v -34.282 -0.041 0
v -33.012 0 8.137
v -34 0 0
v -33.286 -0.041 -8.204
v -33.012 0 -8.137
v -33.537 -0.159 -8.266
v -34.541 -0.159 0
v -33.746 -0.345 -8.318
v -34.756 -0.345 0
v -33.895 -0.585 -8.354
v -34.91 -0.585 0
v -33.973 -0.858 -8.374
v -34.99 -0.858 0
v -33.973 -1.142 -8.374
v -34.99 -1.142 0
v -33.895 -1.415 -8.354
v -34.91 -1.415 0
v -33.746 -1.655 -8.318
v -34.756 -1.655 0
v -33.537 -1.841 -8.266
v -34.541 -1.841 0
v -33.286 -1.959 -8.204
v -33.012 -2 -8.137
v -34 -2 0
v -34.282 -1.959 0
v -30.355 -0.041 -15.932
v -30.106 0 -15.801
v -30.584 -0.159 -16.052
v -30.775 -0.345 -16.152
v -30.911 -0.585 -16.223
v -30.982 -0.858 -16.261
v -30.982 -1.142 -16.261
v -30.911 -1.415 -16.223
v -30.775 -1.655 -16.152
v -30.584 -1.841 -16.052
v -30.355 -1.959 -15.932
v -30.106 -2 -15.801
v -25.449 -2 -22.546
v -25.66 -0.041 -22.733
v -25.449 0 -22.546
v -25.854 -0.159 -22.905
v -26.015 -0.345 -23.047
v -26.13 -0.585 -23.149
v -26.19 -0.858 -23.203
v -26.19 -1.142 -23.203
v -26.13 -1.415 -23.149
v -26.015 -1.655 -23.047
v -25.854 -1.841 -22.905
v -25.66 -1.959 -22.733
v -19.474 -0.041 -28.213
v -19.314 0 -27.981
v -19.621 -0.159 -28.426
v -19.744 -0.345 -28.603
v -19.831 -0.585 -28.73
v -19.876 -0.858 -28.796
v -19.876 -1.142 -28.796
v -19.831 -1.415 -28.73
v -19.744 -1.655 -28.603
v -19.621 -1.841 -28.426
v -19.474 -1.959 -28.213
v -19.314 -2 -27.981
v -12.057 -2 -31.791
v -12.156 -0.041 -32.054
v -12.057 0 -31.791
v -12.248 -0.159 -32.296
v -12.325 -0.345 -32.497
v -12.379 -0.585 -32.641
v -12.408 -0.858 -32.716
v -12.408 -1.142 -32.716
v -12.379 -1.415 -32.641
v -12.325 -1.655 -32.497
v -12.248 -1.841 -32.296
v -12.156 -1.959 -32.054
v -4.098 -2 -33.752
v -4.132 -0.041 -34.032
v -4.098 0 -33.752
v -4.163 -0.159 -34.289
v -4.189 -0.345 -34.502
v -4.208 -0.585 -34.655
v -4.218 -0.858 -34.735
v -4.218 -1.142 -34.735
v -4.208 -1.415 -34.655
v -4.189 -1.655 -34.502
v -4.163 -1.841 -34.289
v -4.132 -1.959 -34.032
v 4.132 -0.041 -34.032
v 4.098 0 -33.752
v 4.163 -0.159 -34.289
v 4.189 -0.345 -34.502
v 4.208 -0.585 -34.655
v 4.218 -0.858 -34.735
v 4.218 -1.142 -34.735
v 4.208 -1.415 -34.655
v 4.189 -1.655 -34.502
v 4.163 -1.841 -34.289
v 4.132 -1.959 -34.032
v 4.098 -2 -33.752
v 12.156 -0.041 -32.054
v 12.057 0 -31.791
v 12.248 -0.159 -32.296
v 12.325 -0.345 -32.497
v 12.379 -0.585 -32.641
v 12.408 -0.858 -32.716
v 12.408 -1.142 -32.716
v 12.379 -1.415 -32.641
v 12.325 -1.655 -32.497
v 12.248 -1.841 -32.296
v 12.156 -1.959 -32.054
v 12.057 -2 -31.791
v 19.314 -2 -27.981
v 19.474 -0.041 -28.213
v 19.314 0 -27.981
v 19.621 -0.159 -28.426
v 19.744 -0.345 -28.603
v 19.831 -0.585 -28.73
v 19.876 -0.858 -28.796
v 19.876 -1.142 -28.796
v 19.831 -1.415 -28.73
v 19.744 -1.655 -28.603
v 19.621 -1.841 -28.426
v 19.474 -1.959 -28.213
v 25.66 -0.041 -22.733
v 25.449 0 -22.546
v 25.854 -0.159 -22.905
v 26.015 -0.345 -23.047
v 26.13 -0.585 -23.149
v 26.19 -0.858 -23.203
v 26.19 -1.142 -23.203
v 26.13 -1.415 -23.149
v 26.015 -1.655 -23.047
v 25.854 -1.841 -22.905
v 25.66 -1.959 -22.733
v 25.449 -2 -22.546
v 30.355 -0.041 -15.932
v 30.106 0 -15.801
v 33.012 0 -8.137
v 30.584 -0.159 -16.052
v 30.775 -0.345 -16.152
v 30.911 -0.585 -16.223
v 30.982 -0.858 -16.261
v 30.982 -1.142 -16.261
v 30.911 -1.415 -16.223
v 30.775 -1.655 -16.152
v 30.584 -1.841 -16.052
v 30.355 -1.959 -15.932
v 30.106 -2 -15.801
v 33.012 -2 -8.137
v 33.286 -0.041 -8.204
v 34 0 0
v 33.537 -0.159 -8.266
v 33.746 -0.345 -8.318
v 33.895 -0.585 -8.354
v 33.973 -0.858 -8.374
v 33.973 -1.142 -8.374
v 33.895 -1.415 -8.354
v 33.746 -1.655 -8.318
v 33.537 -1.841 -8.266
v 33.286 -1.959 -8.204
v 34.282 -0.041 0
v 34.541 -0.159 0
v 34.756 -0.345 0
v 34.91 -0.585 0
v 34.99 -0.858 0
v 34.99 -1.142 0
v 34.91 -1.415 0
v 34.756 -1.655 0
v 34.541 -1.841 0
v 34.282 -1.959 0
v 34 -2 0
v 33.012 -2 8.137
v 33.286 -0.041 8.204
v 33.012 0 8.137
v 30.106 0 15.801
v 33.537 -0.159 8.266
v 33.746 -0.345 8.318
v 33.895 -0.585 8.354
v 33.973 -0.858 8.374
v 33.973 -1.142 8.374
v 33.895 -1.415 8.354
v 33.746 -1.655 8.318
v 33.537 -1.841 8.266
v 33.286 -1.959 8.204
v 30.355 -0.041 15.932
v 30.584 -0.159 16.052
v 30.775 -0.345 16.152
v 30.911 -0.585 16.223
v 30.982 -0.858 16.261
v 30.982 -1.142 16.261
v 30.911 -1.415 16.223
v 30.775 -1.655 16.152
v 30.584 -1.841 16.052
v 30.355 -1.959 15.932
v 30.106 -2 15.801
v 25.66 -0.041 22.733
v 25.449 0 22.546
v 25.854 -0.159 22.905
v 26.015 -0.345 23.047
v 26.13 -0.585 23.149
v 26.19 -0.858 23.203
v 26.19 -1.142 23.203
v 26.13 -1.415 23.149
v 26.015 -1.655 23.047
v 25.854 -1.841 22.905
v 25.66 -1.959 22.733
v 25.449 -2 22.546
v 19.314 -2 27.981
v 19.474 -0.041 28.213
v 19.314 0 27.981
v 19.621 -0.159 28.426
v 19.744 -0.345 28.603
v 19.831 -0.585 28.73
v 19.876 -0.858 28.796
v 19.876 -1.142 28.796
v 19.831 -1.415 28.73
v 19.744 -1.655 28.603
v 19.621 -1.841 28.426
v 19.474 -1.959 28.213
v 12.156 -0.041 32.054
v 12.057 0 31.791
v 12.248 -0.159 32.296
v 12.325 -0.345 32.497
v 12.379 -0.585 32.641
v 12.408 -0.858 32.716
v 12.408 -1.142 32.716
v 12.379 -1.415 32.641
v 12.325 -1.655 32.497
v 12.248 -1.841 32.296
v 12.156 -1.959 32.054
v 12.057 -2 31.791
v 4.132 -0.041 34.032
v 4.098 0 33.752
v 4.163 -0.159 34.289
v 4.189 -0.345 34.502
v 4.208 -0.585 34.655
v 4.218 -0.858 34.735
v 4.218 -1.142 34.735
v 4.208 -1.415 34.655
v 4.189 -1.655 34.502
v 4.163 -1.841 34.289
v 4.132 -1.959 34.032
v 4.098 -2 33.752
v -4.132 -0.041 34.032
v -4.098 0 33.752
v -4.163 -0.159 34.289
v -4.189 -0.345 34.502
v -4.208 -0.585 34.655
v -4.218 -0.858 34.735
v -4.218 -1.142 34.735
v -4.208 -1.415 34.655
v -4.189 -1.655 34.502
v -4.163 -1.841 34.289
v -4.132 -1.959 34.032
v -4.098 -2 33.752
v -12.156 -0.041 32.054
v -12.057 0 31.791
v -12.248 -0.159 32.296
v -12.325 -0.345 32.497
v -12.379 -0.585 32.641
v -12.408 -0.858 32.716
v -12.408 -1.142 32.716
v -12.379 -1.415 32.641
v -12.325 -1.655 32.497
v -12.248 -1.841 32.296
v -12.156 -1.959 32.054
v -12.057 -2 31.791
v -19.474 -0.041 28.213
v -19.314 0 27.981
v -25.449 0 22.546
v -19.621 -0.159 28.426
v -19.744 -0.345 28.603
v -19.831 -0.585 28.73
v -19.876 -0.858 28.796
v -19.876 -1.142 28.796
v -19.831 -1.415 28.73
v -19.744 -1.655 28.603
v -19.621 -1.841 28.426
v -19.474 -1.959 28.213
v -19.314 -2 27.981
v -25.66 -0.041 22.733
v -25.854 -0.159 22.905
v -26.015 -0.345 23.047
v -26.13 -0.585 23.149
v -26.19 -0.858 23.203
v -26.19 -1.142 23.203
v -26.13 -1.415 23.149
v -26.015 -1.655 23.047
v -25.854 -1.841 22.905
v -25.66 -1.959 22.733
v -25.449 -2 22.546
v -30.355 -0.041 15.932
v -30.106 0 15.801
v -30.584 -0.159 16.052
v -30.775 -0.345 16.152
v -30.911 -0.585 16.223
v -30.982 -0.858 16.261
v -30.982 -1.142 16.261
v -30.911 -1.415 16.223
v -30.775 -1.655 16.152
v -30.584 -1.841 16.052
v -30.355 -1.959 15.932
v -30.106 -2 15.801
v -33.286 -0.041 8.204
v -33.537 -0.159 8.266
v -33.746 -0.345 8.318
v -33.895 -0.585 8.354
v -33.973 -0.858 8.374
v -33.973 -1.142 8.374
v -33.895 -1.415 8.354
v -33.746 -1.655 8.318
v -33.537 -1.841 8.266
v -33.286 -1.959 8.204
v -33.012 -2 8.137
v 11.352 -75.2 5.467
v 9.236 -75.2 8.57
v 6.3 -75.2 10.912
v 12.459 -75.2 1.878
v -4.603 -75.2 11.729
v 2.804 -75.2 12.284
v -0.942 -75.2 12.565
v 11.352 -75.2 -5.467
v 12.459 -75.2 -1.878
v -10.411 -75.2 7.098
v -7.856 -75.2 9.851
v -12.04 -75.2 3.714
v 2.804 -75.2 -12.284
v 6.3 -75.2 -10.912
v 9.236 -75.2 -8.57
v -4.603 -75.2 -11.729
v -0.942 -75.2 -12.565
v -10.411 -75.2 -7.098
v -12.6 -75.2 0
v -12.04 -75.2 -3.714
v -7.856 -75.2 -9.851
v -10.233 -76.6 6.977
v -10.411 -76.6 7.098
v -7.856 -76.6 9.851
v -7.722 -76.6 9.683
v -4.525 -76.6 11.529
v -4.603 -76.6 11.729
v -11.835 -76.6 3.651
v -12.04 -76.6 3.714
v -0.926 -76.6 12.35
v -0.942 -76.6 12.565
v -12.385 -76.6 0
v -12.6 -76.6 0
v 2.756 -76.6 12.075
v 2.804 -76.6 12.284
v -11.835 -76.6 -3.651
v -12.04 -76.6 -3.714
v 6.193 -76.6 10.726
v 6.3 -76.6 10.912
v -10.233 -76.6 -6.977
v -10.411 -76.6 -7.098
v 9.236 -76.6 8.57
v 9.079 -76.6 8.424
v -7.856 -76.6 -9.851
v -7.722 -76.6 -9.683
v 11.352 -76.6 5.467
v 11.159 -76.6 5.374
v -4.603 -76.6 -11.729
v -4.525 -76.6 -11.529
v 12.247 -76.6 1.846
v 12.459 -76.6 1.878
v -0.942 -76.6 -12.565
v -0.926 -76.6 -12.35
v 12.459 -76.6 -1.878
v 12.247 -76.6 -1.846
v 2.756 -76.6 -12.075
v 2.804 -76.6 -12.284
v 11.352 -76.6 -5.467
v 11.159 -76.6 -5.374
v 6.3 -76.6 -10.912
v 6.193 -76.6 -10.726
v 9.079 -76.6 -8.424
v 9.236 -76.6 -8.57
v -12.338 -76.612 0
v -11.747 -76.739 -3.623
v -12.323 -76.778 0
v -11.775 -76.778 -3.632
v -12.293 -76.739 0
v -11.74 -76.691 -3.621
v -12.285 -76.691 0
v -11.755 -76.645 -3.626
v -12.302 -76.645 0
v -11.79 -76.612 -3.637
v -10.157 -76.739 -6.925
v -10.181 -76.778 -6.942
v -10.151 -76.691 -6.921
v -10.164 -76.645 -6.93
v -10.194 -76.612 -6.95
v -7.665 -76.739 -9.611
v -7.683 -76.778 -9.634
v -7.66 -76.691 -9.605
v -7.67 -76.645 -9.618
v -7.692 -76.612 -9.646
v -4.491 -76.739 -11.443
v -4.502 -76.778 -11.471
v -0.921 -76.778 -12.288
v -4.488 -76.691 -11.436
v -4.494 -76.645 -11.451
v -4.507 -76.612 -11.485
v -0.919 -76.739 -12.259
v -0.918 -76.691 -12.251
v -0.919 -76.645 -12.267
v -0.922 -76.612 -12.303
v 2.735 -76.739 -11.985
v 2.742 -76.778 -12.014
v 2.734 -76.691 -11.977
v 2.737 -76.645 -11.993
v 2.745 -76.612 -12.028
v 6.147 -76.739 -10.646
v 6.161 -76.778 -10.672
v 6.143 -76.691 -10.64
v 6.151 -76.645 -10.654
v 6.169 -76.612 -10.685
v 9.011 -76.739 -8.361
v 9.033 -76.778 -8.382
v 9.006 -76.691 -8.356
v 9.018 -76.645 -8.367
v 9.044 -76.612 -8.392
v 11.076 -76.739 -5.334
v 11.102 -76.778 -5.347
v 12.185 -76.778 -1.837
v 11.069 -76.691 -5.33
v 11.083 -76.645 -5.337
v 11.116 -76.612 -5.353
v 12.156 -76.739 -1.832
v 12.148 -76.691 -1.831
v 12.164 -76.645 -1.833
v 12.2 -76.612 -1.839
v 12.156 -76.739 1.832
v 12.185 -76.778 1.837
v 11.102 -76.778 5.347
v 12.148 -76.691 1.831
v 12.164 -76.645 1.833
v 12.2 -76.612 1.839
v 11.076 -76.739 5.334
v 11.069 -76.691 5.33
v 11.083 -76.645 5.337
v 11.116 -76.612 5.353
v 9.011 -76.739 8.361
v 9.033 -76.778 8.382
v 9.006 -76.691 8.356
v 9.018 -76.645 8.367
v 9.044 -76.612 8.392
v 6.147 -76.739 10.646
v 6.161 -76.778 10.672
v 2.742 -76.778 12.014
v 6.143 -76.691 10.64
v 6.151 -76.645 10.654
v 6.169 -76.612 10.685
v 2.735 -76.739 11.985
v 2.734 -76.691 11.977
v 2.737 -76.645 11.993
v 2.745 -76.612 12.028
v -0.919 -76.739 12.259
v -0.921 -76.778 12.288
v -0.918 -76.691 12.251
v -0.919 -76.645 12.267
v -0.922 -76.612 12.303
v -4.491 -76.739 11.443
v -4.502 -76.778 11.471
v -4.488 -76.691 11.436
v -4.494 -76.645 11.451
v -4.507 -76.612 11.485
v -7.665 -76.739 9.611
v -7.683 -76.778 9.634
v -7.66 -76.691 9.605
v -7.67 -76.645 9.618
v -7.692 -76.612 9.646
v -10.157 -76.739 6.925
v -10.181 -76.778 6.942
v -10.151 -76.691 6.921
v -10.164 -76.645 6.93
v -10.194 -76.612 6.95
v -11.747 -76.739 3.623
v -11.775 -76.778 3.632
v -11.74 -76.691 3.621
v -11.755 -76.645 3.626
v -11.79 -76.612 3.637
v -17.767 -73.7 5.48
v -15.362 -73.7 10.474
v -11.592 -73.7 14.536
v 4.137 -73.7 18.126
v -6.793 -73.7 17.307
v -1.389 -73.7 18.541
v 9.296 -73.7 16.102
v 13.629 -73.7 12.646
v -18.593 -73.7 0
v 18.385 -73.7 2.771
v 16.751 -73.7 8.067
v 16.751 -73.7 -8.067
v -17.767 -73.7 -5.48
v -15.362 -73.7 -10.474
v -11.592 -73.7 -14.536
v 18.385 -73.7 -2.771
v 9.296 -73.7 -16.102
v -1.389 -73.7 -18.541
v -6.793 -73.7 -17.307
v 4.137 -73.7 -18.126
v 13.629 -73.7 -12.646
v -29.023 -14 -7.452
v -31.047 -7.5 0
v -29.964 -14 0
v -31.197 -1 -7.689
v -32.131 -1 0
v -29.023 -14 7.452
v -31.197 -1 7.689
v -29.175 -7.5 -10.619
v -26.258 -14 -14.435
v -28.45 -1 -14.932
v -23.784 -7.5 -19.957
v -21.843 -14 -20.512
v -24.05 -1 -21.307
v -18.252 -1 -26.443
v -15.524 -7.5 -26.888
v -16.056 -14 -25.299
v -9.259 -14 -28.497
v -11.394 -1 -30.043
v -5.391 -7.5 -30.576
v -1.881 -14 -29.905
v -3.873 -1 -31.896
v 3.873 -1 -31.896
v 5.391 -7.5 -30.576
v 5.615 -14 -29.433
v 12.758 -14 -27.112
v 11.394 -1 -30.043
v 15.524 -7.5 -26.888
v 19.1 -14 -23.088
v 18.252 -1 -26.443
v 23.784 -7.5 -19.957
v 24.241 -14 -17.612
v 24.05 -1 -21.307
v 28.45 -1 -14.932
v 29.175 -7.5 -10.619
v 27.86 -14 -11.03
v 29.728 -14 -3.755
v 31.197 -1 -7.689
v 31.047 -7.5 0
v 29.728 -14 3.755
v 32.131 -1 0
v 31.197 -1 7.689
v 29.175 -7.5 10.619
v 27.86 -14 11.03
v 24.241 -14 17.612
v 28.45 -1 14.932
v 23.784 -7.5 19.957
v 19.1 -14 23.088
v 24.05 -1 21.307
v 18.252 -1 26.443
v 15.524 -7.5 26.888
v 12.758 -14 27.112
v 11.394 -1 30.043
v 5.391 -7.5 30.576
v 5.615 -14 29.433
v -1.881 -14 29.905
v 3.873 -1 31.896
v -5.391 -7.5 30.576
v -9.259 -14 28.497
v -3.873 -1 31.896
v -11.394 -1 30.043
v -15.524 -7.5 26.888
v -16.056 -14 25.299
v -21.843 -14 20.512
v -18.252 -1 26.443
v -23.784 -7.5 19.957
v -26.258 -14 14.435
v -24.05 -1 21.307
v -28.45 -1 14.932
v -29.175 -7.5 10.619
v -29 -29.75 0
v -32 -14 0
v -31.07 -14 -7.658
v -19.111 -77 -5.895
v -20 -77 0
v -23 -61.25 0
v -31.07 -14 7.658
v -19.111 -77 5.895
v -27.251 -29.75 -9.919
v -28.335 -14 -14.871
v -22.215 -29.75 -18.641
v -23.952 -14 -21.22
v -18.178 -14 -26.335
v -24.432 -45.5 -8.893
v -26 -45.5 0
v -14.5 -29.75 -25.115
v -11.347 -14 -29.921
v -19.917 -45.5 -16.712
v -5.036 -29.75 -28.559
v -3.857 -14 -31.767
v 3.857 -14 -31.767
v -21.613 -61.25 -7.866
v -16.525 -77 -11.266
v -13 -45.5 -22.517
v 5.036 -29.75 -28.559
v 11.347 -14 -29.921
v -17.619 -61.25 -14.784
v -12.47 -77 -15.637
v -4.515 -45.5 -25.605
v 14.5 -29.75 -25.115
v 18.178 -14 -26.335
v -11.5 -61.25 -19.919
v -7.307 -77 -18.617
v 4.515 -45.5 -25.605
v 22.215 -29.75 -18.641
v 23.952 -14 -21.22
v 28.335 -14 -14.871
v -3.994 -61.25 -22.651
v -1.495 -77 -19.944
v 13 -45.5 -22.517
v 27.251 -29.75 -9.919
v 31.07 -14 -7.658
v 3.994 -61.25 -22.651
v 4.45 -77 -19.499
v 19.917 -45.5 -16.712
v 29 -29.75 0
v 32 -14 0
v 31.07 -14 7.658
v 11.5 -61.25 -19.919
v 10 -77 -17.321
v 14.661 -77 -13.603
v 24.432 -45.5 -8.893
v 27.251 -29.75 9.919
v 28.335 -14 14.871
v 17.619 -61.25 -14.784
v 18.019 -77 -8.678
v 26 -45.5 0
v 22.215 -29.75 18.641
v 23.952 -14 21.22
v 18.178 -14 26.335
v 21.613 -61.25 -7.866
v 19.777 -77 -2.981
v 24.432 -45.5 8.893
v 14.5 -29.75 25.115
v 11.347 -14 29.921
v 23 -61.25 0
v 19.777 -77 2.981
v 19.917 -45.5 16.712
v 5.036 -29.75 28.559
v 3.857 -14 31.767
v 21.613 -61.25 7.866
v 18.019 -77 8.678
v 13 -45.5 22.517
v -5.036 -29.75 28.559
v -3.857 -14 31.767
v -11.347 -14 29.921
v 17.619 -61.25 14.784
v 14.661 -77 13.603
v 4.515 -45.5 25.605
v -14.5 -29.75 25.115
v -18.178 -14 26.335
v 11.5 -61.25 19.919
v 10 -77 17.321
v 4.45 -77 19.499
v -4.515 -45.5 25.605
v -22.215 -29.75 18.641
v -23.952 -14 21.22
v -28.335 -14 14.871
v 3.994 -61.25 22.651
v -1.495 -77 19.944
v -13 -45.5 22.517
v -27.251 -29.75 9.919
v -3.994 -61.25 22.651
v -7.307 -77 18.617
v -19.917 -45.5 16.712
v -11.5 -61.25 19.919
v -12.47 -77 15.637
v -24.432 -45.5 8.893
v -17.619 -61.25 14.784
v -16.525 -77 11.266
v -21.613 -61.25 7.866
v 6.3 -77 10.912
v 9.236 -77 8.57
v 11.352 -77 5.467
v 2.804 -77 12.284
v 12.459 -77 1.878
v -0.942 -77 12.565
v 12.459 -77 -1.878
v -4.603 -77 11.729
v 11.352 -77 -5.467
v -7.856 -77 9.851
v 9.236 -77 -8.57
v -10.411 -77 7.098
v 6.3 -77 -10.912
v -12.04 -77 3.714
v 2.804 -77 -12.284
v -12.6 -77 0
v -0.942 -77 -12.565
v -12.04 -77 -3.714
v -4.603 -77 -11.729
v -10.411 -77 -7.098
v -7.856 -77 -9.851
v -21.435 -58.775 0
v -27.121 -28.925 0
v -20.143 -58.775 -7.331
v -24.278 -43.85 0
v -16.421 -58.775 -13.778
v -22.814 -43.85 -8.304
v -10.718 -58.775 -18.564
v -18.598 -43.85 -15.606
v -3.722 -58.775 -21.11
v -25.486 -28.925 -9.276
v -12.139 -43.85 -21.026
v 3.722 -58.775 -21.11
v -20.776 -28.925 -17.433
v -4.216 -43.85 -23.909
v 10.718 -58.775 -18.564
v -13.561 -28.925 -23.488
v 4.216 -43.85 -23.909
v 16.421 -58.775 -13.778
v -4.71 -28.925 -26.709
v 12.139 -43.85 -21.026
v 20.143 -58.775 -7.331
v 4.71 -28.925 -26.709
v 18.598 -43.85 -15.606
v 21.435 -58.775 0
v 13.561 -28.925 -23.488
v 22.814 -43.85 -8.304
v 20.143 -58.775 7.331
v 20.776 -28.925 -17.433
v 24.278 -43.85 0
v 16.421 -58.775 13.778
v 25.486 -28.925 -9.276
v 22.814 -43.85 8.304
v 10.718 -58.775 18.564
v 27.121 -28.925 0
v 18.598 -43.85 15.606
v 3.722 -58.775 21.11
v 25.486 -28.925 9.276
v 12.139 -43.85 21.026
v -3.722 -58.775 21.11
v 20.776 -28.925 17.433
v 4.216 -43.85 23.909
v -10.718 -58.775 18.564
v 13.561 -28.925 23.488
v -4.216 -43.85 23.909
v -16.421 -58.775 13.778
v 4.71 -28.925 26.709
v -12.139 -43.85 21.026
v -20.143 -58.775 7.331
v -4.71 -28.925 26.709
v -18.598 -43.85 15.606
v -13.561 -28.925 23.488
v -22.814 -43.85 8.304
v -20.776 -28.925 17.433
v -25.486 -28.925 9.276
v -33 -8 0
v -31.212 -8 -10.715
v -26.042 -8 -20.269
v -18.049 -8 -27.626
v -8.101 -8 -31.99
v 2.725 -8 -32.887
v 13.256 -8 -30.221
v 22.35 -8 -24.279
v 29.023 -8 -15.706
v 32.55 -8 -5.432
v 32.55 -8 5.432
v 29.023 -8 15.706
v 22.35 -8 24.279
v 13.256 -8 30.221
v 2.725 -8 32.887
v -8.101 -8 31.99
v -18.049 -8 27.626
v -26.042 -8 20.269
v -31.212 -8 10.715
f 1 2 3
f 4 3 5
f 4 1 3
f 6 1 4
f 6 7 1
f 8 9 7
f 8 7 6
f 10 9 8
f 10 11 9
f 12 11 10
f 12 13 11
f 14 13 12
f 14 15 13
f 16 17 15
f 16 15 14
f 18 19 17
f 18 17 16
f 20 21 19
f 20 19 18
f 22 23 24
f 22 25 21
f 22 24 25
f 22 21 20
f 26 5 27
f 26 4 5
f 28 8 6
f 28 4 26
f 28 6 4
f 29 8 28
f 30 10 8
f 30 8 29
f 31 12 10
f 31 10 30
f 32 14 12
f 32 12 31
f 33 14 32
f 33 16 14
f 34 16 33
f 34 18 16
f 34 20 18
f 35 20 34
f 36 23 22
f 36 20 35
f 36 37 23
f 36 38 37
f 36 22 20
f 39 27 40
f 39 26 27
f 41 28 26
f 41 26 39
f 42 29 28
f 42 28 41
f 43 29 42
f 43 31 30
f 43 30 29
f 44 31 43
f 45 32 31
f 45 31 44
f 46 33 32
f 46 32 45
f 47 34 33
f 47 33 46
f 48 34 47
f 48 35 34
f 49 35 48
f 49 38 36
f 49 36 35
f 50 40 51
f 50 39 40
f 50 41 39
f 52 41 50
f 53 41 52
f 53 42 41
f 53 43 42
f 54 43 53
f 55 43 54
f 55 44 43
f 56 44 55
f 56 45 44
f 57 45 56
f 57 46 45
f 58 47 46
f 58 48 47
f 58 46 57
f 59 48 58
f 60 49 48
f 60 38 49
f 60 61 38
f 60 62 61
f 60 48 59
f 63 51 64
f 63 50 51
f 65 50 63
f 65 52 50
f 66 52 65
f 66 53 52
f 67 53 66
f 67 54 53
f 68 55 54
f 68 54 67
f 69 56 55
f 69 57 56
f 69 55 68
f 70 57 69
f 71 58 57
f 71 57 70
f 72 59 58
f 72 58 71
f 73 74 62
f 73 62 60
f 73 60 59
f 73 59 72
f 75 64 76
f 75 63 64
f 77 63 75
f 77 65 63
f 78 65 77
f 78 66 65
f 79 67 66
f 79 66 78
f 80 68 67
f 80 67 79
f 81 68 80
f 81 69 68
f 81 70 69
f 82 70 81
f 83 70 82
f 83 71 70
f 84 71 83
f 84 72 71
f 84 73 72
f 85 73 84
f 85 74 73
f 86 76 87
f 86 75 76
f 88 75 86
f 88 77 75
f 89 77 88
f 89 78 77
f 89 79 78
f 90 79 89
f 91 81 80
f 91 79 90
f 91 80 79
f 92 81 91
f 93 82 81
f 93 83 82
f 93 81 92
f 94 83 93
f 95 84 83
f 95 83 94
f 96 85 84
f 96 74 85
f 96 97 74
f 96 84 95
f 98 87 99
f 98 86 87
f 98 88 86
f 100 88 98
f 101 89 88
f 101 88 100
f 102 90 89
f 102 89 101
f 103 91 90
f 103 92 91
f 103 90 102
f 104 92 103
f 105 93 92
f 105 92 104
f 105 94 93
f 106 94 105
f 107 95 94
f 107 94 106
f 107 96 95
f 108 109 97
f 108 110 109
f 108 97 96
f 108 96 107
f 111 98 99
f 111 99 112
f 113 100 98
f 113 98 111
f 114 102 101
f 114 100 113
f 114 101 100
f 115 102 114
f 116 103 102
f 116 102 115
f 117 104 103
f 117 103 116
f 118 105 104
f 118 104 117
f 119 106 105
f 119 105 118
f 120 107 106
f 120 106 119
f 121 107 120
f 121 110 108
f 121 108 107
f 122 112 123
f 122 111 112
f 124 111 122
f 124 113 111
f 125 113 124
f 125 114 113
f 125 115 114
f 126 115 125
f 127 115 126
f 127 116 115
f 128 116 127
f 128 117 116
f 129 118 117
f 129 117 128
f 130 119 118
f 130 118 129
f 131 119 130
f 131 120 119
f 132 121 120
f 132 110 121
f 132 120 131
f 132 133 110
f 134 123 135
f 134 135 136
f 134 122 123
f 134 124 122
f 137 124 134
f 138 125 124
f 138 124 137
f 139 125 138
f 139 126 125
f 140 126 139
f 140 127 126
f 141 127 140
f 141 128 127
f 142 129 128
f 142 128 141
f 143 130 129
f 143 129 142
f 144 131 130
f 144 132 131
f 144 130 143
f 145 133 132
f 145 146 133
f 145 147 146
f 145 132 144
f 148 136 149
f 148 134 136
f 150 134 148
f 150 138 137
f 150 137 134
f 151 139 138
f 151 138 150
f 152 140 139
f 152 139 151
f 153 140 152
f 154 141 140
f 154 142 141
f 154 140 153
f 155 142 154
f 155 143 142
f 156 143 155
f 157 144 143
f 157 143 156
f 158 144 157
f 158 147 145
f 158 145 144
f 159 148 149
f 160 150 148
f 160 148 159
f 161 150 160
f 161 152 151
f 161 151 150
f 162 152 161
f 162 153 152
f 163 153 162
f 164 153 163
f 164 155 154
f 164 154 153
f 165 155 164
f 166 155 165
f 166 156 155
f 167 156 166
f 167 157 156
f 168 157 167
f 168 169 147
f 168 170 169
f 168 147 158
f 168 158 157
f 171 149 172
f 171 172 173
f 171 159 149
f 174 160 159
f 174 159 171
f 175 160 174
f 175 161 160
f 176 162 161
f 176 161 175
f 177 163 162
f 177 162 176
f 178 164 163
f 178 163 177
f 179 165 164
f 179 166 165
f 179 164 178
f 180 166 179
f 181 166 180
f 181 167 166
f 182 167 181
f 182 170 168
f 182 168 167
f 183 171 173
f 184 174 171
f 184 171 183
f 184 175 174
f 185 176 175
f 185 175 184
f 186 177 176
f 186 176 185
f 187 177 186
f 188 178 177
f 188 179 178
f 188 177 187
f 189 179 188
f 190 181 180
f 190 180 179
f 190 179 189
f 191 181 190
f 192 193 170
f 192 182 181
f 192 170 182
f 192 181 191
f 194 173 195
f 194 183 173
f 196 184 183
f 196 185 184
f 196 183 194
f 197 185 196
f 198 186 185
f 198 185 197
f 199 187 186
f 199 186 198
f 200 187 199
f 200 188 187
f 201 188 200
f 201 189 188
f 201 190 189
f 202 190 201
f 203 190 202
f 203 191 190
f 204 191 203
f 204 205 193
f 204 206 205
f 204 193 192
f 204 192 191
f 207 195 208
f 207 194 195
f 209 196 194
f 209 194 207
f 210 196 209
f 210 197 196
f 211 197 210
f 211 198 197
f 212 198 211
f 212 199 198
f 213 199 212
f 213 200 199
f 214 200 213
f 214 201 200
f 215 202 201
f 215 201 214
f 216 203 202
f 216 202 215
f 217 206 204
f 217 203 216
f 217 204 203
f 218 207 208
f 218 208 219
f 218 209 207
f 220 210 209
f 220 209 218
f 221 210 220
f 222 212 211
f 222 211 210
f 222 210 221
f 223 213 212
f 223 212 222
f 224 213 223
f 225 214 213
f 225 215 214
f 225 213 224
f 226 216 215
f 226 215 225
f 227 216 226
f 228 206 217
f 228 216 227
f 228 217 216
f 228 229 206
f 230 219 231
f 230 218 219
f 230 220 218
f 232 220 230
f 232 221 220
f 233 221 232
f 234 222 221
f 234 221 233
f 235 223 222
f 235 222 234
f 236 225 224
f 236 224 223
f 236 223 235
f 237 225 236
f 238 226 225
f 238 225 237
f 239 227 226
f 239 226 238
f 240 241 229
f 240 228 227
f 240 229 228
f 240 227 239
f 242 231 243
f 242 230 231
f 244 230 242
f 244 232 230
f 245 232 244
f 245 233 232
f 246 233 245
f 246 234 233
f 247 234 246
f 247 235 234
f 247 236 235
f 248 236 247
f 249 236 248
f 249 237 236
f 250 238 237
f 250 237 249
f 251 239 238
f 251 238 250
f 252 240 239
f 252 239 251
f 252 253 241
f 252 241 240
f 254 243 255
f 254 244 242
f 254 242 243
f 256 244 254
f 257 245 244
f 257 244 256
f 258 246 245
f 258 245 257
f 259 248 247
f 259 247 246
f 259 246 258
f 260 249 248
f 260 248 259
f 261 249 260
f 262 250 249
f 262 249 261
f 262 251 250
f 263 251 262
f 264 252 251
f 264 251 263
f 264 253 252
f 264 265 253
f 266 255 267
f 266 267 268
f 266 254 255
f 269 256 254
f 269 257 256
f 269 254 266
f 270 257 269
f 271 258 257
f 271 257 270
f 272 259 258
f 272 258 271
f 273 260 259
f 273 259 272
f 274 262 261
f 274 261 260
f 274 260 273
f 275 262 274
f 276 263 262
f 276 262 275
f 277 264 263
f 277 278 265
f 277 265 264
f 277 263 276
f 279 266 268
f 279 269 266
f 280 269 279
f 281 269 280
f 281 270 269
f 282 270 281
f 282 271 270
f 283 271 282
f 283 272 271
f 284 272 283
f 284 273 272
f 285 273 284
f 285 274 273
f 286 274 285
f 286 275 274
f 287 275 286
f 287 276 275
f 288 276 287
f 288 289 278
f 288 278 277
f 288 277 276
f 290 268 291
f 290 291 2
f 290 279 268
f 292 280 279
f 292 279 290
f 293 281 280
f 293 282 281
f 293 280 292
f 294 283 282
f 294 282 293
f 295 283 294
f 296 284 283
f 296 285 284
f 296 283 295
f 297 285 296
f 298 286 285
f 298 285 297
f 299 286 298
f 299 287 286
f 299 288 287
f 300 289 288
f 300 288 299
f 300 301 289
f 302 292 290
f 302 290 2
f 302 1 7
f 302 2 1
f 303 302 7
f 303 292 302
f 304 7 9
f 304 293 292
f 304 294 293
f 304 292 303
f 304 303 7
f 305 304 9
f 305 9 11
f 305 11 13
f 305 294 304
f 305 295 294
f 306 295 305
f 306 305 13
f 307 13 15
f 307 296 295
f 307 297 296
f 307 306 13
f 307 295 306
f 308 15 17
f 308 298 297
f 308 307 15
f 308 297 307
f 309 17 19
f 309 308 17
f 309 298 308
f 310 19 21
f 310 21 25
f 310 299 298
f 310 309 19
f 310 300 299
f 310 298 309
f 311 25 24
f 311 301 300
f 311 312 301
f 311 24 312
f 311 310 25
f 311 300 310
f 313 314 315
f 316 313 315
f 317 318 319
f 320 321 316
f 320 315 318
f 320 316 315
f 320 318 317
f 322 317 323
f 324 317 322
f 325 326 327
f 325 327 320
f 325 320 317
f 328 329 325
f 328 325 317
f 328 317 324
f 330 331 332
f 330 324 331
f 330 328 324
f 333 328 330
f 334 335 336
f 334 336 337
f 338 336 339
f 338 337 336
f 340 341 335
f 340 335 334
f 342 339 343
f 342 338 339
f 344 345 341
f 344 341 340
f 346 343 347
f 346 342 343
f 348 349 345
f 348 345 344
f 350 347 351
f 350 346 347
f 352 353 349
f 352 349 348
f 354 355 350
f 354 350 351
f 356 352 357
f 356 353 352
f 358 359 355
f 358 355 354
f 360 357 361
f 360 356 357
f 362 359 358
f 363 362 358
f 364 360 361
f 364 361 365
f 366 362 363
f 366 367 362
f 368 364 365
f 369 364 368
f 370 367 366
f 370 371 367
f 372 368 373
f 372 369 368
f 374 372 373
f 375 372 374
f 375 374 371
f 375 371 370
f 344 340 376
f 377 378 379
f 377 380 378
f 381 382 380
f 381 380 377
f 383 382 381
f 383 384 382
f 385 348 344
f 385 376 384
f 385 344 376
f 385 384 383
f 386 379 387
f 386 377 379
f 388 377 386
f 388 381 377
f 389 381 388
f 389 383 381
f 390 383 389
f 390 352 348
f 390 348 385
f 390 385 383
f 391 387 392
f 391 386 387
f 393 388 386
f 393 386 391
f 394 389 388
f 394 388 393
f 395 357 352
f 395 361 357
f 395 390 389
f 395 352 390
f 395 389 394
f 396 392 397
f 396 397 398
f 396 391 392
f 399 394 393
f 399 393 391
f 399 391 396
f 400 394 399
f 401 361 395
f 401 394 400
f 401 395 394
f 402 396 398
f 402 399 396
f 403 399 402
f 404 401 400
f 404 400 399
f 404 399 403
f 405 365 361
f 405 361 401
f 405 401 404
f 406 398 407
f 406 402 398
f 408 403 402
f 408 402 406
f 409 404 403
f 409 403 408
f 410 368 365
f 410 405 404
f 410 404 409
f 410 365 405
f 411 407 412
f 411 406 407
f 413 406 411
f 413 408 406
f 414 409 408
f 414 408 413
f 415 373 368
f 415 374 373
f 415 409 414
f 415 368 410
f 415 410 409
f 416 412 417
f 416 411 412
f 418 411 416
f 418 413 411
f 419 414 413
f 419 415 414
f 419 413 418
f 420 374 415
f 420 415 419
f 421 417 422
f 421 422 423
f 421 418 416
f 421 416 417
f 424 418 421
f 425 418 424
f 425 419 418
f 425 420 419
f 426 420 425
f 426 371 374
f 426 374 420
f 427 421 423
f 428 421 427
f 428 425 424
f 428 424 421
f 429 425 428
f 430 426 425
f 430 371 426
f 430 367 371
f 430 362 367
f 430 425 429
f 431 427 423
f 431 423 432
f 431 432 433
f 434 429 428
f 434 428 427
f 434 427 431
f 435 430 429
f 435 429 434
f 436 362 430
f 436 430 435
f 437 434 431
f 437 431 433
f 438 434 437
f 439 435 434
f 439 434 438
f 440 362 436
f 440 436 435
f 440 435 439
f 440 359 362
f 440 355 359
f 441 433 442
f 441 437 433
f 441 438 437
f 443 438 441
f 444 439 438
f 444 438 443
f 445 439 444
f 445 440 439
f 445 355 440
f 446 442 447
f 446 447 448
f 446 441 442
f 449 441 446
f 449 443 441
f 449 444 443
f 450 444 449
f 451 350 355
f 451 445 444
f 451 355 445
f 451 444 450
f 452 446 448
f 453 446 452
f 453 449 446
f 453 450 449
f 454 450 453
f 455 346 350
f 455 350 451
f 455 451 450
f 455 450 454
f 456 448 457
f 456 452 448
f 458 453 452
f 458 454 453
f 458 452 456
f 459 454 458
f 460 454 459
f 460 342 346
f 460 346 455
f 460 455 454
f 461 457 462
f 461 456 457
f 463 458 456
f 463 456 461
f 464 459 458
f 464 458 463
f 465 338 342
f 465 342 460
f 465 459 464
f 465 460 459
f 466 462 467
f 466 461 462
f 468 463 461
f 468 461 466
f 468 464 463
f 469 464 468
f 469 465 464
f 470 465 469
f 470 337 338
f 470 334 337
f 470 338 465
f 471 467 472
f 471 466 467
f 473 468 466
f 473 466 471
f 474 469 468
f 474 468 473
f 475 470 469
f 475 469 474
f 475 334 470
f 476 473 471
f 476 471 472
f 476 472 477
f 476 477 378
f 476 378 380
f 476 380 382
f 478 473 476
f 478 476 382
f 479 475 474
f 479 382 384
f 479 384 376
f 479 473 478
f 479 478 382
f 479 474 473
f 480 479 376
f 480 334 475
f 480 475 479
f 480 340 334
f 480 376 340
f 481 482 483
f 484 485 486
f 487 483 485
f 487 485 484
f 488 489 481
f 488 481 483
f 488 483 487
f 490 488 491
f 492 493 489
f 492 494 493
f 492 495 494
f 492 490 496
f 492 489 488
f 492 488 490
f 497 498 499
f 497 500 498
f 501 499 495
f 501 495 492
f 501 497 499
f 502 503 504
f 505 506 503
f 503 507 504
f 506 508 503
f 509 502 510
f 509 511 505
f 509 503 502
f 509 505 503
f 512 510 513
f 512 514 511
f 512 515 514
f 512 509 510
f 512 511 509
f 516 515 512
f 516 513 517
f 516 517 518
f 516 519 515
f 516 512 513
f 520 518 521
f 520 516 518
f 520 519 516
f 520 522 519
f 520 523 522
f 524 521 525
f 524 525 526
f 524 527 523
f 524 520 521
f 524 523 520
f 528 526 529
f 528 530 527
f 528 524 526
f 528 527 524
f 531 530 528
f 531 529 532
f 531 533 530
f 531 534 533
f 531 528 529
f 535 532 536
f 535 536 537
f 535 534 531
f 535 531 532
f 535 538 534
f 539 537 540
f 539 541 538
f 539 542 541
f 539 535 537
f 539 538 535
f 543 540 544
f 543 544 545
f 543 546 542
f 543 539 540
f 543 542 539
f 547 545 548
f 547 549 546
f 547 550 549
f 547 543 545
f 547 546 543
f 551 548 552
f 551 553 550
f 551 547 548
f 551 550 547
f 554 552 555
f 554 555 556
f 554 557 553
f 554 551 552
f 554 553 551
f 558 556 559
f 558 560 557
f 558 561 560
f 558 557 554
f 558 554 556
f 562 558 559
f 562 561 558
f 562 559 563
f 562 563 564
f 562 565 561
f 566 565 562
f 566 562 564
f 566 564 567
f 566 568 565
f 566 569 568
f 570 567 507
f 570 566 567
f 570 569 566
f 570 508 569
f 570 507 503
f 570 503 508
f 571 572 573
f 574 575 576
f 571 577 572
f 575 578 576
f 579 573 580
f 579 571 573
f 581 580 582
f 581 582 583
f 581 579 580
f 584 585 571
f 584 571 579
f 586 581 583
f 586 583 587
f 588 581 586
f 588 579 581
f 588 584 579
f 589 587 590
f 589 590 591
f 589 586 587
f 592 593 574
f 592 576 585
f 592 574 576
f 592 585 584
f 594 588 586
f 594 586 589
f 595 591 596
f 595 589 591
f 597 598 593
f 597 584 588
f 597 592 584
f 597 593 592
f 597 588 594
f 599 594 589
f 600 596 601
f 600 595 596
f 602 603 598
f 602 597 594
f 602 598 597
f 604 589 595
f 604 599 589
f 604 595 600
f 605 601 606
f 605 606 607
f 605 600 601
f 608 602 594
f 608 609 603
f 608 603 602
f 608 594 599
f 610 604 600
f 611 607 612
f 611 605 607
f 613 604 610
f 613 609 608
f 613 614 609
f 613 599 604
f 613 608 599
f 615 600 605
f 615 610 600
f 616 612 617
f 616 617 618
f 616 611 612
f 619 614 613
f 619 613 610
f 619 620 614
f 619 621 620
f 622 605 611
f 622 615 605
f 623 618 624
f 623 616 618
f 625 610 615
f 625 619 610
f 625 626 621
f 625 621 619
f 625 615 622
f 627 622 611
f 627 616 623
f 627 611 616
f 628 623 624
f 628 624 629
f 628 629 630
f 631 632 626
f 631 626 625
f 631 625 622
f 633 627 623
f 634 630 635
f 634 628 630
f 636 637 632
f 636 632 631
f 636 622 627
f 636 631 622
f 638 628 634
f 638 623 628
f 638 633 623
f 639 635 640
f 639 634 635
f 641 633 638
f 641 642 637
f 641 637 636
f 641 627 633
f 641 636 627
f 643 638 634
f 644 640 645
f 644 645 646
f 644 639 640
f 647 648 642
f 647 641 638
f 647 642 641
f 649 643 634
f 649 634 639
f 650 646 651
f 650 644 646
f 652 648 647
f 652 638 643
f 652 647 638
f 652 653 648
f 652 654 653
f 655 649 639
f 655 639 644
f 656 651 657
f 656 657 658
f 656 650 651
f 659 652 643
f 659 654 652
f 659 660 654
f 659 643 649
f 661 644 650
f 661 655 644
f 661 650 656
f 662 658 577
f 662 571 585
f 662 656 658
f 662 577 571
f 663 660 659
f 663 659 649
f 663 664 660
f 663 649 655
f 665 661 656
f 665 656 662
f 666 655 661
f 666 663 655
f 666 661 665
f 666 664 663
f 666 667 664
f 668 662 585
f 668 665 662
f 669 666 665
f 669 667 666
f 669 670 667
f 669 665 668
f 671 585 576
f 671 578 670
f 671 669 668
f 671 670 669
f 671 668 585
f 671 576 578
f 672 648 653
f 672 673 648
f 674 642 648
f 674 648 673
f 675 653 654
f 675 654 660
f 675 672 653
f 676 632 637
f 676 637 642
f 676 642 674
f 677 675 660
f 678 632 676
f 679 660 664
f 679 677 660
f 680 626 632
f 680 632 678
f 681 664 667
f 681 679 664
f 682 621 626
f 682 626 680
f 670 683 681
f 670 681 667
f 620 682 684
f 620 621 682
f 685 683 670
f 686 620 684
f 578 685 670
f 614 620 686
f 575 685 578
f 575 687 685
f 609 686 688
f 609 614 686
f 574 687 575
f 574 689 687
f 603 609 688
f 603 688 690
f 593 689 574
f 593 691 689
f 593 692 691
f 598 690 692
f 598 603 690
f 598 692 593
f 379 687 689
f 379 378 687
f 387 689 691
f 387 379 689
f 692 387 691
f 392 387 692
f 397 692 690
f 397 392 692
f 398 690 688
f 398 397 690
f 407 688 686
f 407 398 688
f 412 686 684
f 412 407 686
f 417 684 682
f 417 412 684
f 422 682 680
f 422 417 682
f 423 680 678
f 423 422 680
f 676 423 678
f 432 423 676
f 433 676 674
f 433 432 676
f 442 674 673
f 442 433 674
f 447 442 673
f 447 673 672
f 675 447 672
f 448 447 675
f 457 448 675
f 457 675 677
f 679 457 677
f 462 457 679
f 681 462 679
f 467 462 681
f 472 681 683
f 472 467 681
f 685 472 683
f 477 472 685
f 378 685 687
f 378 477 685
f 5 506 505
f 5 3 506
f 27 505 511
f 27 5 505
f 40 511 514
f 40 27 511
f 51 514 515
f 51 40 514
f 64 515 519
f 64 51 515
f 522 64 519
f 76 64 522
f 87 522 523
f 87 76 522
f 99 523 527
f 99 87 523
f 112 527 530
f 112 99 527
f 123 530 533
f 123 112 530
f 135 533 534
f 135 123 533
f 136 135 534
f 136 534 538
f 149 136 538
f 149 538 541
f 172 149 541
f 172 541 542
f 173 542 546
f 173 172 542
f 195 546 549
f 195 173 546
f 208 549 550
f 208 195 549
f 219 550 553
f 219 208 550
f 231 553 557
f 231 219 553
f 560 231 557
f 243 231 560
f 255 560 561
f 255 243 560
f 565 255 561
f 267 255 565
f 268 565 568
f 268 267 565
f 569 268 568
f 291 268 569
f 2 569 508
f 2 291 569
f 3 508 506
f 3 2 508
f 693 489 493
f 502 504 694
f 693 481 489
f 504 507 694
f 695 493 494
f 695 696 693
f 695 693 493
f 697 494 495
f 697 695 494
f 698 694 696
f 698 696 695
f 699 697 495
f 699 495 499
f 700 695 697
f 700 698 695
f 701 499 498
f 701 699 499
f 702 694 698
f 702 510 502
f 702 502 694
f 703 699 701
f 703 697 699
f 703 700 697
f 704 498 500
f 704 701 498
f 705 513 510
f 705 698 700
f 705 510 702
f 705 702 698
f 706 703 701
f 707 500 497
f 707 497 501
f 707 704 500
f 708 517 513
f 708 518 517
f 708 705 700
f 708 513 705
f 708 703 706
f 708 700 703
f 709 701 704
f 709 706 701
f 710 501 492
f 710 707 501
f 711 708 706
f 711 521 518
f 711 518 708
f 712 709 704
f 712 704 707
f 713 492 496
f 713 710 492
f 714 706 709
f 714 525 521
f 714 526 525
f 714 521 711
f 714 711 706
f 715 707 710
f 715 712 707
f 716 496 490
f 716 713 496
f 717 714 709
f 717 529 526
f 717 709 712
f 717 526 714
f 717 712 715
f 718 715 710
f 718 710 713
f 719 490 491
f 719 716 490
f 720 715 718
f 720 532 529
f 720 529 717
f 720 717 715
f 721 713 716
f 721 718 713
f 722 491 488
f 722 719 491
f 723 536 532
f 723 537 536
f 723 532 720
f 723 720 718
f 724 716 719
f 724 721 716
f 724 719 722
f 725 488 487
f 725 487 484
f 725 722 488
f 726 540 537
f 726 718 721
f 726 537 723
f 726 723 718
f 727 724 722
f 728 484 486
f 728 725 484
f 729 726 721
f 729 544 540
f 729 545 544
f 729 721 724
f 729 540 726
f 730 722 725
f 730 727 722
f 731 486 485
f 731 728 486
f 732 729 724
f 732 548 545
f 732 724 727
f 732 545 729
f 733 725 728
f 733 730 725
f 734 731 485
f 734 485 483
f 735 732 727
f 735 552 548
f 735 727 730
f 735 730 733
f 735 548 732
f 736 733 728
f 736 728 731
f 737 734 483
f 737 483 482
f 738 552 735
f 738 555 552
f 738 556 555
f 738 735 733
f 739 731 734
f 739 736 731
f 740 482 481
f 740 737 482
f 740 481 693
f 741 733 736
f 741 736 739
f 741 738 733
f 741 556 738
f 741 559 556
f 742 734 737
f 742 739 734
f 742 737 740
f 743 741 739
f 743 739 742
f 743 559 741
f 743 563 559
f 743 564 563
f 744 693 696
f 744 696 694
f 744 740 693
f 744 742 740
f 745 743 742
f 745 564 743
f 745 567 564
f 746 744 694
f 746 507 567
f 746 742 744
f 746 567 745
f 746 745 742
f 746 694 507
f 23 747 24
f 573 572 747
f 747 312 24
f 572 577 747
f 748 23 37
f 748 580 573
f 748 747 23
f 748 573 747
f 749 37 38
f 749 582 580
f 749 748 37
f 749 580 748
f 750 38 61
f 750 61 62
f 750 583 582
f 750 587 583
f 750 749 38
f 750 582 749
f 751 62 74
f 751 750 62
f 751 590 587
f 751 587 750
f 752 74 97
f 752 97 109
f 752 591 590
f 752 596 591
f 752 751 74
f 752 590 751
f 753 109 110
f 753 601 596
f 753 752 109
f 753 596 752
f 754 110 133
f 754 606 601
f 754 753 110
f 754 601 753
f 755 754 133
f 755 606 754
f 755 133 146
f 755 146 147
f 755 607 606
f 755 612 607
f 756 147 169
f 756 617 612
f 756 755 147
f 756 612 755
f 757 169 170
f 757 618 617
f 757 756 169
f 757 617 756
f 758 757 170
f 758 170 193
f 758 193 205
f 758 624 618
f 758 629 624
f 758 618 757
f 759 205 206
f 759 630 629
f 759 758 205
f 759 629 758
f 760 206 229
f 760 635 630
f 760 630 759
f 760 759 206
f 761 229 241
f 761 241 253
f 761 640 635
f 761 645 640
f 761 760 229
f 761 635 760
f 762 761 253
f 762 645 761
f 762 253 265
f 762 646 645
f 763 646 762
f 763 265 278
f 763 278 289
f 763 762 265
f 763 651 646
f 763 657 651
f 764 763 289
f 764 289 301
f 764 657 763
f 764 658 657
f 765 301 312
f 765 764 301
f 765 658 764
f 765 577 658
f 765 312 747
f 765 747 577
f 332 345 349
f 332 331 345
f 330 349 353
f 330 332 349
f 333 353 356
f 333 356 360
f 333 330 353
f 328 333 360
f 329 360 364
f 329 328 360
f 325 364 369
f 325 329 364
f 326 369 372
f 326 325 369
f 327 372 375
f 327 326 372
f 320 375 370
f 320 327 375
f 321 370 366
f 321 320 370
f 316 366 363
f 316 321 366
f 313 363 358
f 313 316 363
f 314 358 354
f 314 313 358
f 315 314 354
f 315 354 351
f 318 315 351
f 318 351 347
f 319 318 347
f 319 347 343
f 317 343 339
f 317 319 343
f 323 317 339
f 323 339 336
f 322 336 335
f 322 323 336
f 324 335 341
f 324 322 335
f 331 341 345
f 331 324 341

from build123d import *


with BuildPart() as part:
    # Sketch1 → Revolve1 (revolve)
    with BuildSketch(Plane.XY):
        with BuildLine():
            Line((-32.130708731, -1), (-34, 0))
            ThreePointArc((-34, 0), (-35, -1), (-34, -2))
            Line((-34, -2), (-32, -14))
            Line((-32, -14), (-20, -77))
            Line((-20, -77), (-12.6, -77))
            Line((-12.6, -77), (-12.322608601, -76.778086881))
            ThreePointArc((-12.322608601, -76.778086881), (-12.290715274, -76.666899306), (-12.385078106, -76.6))
            Line((-12.385078106, -76.6), (-12.6, -76.6))
            Line((-12.6, -76.6), (-12.6, -75.2))
            Line((-12.6, -75.2), (0, -75.2))
            Line((0, -75.2), (0, -73.7))
            Line((0, -73.7), (-18.592613493, -73.7))
            Line((-18.592613493, -73.7), (-29.964042064, -14))
            Line((-29.964042064, -14), (-32.130708731, -1))
        make_face()
    revolve(axis=Axis((0, 0, 0), (0, -1, 0)))


solid = part.part
